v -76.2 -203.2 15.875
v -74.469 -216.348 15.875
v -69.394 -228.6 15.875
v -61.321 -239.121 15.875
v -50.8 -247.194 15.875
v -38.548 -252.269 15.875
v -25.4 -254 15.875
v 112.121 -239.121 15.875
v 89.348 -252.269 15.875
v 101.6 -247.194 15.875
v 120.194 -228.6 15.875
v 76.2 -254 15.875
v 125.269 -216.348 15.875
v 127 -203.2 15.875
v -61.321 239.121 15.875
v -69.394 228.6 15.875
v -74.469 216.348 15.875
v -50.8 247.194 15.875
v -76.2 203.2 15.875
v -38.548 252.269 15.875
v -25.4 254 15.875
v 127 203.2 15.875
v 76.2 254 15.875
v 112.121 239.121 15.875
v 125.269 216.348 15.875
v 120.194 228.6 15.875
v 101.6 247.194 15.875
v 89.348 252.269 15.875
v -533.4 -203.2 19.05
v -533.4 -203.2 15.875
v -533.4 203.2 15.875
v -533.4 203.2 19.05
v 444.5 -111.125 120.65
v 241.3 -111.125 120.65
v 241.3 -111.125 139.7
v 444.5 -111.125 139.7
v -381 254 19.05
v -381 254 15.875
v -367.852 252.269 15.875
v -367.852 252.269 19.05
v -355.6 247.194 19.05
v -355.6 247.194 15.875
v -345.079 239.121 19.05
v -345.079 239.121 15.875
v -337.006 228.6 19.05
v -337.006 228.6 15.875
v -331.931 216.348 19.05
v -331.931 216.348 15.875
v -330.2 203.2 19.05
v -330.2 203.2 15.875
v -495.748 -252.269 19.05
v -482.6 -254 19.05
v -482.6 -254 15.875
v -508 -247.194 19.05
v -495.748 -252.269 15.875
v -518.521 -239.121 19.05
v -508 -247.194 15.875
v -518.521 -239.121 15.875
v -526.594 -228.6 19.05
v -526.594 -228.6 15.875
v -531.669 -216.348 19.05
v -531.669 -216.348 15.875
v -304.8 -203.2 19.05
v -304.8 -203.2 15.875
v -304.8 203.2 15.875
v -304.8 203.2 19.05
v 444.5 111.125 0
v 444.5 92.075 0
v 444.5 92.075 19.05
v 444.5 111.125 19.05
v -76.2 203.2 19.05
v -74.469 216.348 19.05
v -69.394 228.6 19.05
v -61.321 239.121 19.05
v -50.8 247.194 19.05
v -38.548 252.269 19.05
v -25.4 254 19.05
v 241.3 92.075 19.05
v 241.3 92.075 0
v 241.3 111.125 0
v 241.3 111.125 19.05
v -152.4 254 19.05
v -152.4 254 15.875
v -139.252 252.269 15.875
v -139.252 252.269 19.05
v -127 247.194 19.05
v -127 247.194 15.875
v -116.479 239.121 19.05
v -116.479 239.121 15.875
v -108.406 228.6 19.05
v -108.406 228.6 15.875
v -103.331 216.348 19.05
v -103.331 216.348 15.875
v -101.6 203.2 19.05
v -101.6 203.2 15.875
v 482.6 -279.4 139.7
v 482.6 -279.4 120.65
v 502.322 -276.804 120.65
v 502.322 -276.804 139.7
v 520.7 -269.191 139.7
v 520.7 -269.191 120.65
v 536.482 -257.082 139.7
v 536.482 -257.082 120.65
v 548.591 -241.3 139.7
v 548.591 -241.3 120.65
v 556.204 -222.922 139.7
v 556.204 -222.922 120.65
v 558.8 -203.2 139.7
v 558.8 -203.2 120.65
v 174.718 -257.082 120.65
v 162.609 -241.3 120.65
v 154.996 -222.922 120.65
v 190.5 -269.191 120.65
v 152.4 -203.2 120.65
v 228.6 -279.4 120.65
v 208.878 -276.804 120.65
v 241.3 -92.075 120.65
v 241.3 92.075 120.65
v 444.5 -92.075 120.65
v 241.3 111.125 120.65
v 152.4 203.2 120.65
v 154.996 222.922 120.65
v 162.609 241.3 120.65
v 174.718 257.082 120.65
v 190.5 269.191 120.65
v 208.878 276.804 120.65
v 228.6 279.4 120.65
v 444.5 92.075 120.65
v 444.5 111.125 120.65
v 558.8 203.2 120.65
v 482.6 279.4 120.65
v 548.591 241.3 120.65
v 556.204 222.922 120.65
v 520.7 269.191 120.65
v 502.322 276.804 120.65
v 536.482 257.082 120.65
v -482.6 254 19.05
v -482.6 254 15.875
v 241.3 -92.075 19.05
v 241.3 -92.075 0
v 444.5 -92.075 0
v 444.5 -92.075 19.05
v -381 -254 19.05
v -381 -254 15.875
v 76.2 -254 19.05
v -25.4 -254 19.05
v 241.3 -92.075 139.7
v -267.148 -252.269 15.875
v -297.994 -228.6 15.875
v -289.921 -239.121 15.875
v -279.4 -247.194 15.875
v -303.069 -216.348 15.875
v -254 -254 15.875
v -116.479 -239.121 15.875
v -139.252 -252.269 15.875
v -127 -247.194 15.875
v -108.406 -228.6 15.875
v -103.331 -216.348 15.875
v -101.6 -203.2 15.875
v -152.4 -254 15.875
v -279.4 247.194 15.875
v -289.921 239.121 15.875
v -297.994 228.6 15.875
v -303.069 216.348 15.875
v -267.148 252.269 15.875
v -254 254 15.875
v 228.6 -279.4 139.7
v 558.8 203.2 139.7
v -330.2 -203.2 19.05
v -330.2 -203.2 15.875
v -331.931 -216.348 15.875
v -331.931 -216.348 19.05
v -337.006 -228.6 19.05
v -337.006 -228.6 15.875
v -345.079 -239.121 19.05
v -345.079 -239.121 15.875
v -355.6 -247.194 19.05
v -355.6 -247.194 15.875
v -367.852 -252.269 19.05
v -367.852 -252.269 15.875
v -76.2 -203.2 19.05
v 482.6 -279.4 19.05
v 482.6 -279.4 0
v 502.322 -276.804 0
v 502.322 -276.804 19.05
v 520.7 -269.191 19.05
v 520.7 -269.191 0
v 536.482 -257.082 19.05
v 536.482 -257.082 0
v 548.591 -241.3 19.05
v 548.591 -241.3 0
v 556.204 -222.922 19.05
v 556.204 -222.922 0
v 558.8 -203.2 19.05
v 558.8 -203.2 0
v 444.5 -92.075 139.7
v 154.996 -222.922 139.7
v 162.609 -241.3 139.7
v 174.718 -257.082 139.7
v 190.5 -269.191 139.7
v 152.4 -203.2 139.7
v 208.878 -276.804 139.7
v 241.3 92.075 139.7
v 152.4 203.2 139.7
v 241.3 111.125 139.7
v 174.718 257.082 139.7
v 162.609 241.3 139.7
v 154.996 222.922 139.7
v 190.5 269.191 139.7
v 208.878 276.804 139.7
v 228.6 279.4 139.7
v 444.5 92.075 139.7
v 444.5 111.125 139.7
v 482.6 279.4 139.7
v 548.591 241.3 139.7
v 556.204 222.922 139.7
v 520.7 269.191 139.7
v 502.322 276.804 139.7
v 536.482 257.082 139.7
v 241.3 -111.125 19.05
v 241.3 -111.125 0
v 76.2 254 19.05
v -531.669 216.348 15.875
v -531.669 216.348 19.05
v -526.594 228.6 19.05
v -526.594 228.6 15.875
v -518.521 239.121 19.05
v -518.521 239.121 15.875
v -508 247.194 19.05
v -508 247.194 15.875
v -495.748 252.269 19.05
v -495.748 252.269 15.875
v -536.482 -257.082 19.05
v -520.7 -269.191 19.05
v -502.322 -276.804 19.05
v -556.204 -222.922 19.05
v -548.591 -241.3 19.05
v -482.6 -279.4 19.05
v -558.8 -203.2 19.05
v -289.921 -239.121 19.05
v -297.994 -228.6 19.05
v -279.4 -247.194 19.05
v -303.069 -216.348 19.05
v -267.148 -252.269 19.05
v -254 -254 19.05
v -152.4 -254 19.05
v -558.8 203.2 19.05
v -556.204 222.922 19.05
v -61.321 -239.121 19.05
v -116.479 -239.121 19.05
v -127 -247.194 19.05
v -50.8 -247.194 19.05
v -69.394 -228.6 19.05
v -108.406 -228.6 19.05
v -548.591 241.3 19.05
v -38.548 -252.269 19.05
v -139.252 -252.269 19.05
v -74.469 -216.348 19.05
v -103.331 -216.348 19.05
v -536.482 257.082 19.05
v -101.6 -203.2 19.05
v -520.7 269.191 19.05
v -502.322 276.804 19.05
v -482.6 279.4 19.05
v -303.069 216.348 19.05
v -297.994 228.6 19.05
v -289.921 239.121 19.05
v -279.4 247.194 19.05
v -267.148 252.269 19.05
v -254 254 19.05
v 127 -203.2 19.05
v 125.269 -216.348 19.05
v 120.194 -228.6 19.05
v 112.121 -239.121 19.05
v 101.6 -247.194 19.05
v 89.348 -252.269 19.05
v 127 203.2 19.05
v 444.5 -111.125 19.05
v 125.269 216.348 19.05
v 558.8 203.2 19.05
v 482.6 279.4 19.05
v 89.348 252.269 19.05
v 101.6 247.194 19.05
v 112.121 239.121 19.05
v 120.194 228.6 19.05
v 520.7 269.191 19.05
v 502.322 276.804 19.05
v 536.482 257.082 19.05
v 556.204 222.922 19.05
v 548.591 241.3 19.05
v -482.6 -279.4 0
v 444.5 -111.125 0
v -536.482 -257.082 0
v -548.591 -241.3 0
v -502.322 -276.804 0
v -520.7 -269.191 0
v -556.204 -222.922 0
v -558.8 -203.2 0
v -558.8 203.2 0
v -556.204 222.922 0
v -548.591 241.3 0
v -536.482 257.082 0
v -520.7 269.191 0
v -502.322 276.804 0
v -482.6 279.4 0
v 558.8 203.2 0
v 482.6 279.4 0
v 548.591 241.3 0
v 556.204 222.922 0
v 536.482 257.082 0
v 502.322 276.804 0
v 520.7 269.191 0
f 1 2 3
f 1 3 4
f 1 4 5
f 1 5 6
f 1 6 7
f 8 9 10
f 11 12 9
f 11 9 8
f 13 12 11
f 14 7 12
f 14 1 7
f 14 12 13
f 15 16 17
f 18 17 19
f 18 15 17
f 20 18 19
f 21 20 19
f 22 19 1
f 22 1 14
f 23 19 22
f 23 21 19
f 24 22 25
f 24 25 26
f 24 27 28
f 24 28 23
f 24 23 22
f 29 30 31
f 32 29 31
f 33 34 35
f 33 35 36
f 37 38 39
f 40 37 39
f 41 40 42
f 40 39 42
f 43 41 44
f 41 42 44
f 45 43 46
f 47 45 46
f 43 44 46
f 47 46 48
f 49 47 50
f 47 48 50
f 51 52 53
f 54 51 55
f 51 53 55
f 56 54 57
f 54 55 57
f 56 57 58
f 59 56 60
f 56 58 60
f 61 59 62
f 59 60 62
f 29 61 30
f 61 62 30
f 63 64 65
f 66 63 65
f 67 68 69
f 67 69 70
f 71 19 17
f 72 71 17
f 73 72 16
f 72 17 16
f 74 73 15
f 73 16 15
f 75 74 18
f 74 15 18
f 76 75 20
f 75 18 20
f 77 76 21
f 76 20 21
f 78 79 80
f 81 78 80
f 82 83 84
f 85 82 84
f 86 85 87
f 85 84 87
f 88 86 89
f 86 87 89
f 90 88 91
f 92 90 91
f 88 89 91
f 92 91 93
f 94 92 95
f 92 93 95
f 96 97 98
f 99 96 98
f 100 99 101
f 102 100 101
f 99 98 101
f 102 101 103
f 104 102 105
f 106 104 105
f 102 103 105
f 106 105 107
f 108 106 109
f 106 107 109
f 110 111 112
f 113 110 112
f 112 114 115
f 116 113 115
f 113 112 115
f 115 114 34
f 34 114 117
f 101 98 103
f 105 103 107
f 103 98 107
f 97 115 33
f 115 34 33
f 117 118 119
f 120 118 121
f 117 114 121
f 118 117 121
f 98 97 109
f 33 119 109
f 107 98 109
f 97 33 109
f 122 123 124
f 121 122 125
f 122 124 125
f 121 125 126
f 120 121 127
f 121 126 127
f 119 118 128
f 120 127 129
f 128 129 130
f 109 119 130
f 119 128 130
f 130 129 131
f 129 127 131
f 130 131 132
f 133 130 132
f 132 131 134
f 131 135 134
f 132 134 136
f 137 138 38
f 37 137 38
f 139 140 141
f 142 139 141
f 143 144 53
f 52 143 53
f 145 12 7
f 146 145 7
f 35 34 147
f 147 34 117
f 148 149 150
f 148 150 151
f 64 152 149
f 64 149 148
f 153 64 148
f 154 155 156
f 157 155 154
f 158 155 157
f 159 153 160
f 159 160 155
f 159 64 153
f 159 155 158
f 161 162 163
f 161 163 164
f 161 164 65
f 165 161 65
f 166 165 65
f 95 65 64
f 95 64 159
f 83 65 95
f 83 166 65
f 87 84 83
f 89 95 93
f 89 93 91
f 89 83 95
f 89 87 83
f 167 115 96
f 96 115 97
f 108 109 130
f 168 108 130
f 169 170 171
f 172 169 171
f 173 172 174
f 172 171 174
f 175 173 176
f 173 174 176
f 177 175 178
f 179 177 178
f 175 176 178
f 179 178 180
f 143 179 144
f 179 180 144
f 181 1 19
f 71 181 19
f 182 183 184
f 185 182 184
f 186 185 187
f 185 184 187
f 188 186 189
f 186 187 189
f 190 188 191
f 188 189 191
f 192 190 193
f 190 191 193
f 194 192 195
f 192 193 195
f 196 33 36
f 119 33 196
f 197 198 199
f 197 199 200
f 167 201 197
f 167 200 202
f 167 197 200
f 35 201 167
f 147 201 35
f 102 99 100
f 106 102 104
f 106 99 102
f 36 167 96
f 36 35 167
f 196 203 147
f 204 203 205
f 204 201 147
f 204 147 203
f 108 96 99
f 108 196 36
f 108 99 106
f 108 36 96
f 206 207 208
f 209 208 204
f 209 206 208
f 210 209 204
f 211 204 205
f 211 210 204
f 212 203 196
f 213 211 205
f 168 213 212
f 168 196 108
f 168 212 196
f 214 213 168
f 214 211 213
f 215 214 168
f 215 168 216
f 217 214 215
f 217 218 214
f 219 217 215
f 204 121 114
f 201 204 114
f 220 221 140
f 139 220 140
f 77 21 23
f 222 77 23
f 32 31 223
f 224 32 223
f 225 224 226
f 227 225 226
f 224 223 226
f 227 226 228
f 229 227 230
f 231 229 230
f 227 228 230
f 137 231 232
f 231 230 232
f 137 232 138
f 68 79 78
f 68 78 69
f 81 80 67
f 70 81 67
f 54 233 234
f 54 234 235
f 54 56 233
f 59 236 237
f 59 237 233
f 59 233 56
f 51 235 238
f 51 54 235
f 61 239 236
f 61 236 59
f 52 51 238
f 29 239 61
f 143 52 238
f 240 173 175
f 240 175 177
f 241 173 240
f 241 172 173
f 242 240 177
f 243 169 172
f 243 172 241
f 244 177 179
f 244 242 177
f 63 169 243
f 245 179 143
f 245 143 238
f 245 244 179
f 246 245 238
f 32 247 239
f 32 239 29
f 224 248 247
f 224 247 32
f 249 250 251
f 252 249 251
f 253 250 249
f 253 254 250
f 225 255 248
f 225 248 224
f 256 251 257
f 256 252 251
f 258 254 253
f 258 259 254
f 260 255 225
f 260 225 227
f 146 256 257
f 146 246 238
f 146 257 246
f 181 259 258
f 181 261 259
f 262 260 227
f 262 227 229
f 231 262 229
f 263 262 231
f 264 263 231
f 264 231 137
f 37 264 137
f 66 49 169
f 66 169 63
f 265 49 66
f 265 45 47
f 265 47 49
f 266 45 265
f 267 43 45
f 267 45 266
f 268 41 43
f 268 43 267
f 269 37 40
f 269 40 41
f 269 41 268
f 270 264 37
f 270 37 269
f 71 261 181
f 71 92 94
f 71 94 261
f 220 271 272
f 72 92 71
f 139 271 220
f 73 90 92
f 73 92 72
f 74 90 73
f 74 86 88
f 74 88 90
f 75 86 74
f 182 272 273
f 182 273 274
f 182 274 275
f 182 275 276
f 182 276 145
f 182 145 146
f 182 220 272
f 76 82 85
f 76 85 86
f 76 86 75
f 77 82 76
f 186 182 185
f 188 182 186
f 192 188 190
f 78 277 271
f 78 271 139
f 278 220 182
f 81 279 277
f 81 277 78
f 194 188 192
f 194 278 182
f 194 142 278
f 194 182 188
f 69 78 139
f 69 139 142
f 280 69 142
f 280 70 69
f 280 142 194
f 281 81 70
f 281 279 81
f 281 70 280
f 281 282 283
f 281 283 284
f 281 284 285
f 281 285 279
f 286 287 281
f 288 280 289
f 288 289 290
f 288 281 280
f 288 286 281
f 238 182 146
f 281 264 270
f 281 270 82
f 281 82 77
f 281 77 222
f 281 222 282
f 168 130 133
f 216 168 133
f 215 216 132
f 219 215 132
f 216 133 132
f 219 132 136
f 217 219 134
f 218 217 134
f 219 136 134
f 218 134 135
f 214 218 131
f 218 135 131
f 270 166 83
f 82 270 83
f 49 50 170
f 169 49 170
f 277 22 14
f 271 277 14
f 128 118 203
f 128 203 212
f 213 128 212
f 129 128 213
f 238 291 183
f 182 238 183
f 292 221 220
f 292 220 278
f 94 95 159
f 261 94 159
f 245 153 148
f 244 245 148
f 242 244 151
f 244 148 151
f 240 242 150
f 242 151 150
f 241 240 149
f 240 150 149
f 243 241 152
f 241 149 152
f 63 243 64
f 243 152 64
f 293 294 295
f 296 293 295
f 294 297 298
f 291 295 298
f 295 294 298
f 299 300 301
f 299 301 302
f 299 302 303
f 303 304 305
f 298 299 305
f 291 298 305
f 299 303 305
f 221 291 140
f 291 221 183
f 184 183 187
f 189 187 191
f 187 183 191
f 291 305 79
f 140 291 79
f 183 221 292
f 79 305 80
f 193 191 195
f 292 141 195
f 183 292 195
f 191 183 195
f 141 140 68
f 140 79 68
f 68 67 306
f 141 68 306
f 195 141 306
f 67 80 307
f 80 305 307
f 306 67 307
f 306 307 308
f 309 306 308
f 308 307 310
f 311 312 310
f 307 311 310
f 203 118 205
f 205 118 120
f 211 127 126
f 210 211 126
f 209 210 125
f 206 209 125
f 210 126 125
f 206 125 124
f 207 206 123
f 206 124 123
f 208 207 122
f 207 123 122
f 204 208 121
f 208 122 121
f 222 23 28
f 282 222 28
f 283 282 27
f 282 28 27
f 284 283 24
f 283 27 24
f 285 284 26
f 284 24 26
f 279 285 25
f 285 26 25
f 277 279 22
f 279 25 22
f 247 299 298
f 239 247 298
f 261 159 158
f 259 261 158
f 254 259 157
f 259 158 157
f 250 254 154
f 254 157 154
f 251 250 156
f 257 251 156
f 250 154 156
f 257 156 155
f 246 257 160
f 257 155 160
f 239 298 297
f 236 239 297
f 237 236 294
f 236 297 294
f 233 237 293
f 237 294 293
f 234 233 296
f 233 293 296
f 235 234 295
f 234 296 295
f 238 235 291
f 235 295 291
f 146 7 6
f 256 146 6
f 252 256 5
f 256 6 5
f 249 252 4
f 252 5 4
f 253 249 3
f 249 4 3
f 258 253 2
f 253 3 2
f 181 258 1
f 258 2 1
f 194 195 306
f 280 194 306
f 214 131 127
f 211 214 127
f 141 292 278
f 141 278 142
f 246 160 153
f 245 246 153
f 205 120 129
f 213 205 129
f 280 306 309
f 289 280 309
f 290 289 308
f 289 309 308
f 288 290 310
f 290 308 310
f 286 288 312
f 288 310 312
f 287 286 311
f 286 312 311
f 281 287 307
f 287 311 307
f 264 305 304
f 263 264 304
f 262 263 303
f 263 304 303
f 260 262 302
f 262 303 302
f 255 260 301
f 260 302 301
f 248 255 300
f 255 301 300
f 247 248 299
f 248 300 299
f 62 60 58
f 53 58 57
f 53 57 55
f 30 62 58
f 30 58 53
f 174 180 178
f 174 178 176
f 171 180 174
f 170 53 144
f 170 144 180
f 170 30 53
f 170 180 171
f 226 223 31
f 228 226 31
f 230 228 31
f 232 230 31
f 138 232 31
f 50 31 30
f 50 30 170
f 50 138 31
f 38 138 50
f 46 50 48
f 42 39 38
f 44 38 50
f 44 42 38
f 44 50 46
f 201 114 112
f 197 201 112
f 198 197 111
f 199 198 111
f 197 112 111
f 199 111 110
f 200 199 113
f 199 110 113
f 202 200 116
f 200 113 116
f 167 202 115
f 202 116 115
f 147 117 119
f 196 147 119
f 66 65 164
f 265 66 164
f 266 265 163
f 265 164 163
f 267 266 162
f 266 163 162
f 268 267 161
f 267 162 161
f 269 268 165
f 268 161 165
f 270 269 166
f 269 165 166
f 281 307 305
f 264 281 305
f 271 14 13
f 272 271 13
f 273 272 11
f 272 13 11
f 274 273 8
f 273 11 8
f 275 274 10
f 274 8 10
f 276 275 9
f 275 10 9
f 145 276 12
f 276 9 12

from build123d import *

# Parameters (mm, degrees)
F0_W     = 203.2
F0_H     = 19.05
F1_DEPTH = 19.05
F2_DEPTH = 15.875
F4_W     = 203.2
F4_H     = 19.05
F5_DEPTH = 19.05
F6_DEPTH = 25.4
F7_DEPTH = 25.4


with BuildPart() as f1:
    # F0 (on Top) → F1 (new body)
    with BuildSketch(Plane.XY):
        with BuildLine():
            Line((-482.6, -279.4), (482.6, -279.4))
            ThreePointArc((482.6, -279.4), (536.4815367264, -257.0815367264), (558.8, -203.2))
            Line((558.8, -203.2), (558.8, 203.2))
            ThreePointArc((558.8, 203.2), (536.4815367264, 257.0815367264), (482.6, 279.4))
            Line((482.6, 279.4), (-482.6, 279.4))
            ThreePointArc((-482.6, 279.4), (-536.4815367264, 257.0815367264), (-558.8, 203.2))
            Line((-558.8, 203.2), (-558.8, -203.2))
            ThreePointArc((-558.8, -203.2), (-536.4815367264, -257.0815367264), (-482.6, -279.4))
        make_face()
        with Locations((342.9, -101.6)):
            Rectangle(F0_W, F0_H, mode=Mode.SUBTRACT)
        with BuildLine():
            ThreePointArc((-533.4, 203.2), (-518.5210244843, 239.1210244843), (-482.6, 254))
            Line((-482.6, 254), (-381, 254))
            ThreePointArc((-381, 254), (-345.0789755157, 239.1210244843), (-330.2, 203.2))
            Line((-330.2, 203.2), (-330.2, -203.2))
            ThreePointArc((-330.2, -203.2), (-345.0789755157, -239.1210244843), (-381, -254))
            Line((-381, -254), (-482.6, -254))
            ThreePointArc((-482.6, -254), (-518.5210244843, -239.1210244843), (-533.4, -203.2))
            Line((-533.4, -203.2), (-533.4, 203.2))
        make_face(mode=Mode.SUBTRACT)
        with BuildLine():
            Line((-304.8, -203.2), (-304.8, 203.2))
            ThreePointArc((-304.8, 203.2), (-289.9210244843, 239.1210244843), (-254, 254))
            Line((-254, 254), (-152.4, 254))
            ThreePointArc((-152.4, 254), (-116.4789755157, 239.1210244843), (-101.6, 203.2))
            Line((-101.6, 203.2), (-101.6, -203.2))
            ThreePointArc((-101.6, -203.2), (-116.4789755157, -239.1210244843), (-152.4, -254))
            Line((-152.4, -254), (-254, -254))
            ThreePointArc((-254, -254), (-289.9210244843, -239.1210244843), (-304.8, -203.2))
        make_face(mode=Mode.SUBTRACT)
        with BuildLine():
            Line((-25.4, 254), (76.2, 254))
            ThreePointArc((76.2, 254), (112.1210244843, 239.1210244843), (127, 203.2))
            Line((127, 203.2), (127, 0))
            Line((127, 0), (127, -203.2))
            ThreePointArc((127, -203.2), (112.1210244843, -239.1210244843), (76.2, -254))
            Line((76.2, -254), (-25.4, -254))
            ThreePointArc((-25.4, -254), (-61.3210244843, -239.1210244843), (-76.2, -203.2))
            Line((-76.2, -203.2), (-76.2, 203.2))
            ThreePointArc((-76.2, 203.2), (-61.3210244843, 239.1210244843), (-25.4, 254))
        make_face(mode=Mode.SUBTRACT)
        with Locations((342.9, 101.6)):
            Rectangle(F0_W, F0_H, mode=Mode.SUBTRACT)
    extrude(amount=F1_DEPTH)

    # F0 (on Top) → F2 (join)
    with BuildSketch(Plane.XY):
        with BuildLine():
            Line((-381, 254), (-482.6, 254))
            ThreePointArc((-482.6, 254), (-518.5210244843, 239.1210244843), (-533.4, 203.2))
            Line((-533.4, 203.2), (-533.4, -203.2))
            ThreePointArc((-533.4, -203.2), (-518.5210244843, -239.1210244843), (-482.6, -254))
            Line((-482.6, -254), (-381, -254))
            ThreePointArc((-381, -254), (-345.0789755157, -239.1210244843), (-330.2, -203.2))
            Line((-330.2, -203.2), (-330.2, 203.2))
            ThreePointArc((-330.2, 203.2), (-345.0789755157, 239.1210244843), (-381, 254))
        make_face()
        with BuildLine():
            ThreePointArc((-254, 254), (-289.9210244843, 239.1210244843), (-304.8, 203.2))
            Line((-304.8, 203.2), (-304.8, -203.2))
            ThreePointArc((-304.8, -203.2), (-289.9210244843, -239.1210244843), (-254, -254))
            Line((-254, -254), (-152.4, -254))
            ThreePointArc((-152.4, -254), (-116.4789755157, -239.1210244843), (-101.6, -203.2))
            Line((-101.6, -203.2), (-101.6, 203.2))
            ThreePointArc((-101.6, 203.2), (-116.4789755157, 239.1210244843), (-152.4, 254))
            Line((-152.4, 254), (-254, 254))
        make_face()
        with BuildLine():
            ThreePointArc((127, 203.2), (112.1210244843, 239.1210244843), (76.2, 254))
            Line((76.2, 254), (-25.4, 254))
            ThreePointArc((-25.4, 254), (-61.3210244843, 239.1210244843), (-76.2, 203.2))
            Line((-76.2, 203.2), (-76.2, -203.2))
            ThreePointArc((-76.2, -203.2), (-61.3210244843, -239.1210244843), (-25.4, -254))
            Line((-25.4, -254), (76.2, -254))
            ThreePointArc((76.2, -254), (112.1210244843, -239.1210244843), (127, -203.2))
            Line((127, -203.2), (127, 0))
            Line((127, 0), (127, 203.2))
        make_face()
    extrude(amount=F2_DEPTH)

    # F0 (on Top) → F6 (cut)
    with BuildSketch(Plane.XY):
        with Locations((342.9, -101.6)):
            Rectangle(F0_W, F0_H)
        with Locations((342.9, 101.6)):
            Rectangle(F0_W, F0_H)
    extrude(amount=-F6_DEPTH, mode=Mode.SUBTRACT)

    # F4 (on offset) → F7 (cut)
    with BuildSketch(Plane.XY.offset(120.65)):
        with Locations((342.9, 101.6)):
            Rectangle(F4_W, F4_H)
        with Locations((342.9, -101.6)):
            Rectangle(F4_W, F4_H)
    extrude(amount=-F7_DEPTH, mode=Mode.SUBTRACT)


with BuildPart() as f5:
    # F4 (on offset) → F5 (new body)
    with BuildSketch(Plane.XY.offset(120.65)):
        with BuildLine():
            ThreePointArc((482.6, -279.4), (536.4815367264, -257.0815367264), (558.8, -203.2))
            Line((558.8, -203.2), (558.8, 203.2))
            ThreePointArc((558.8, 203.2), (536.4815367264, 257.0815367264), (482.6, 279.4))
            Line((482.6, 279.4), (228.6, 279.4))
            ThreePointArc((228.6, 279.4), (174.7184632736, 257.0815367264), (152.4, 203.2))
            Line((152.4, 203.2), (152.4, -203.2))
            ThreePointArc((152.4, -203.2), (174.7184632736, -257.0815367264), (228.6, -279.4))
            Line((228.6, -279.4), (482.6, -279.4))
        make_face()
        with Locations((342.9, -101.6)):
            Rectangle(F4_W, F4_H, mode=Mode.SUBTRACT)
        with Locations((342.9, 101.6)):
            Rectangle(F4_W, F4_H, mode=Mode.SUBTRACT)
    extrude(amount=F5_DEPTH)


solid = Compound([f1.part, f5.part])
